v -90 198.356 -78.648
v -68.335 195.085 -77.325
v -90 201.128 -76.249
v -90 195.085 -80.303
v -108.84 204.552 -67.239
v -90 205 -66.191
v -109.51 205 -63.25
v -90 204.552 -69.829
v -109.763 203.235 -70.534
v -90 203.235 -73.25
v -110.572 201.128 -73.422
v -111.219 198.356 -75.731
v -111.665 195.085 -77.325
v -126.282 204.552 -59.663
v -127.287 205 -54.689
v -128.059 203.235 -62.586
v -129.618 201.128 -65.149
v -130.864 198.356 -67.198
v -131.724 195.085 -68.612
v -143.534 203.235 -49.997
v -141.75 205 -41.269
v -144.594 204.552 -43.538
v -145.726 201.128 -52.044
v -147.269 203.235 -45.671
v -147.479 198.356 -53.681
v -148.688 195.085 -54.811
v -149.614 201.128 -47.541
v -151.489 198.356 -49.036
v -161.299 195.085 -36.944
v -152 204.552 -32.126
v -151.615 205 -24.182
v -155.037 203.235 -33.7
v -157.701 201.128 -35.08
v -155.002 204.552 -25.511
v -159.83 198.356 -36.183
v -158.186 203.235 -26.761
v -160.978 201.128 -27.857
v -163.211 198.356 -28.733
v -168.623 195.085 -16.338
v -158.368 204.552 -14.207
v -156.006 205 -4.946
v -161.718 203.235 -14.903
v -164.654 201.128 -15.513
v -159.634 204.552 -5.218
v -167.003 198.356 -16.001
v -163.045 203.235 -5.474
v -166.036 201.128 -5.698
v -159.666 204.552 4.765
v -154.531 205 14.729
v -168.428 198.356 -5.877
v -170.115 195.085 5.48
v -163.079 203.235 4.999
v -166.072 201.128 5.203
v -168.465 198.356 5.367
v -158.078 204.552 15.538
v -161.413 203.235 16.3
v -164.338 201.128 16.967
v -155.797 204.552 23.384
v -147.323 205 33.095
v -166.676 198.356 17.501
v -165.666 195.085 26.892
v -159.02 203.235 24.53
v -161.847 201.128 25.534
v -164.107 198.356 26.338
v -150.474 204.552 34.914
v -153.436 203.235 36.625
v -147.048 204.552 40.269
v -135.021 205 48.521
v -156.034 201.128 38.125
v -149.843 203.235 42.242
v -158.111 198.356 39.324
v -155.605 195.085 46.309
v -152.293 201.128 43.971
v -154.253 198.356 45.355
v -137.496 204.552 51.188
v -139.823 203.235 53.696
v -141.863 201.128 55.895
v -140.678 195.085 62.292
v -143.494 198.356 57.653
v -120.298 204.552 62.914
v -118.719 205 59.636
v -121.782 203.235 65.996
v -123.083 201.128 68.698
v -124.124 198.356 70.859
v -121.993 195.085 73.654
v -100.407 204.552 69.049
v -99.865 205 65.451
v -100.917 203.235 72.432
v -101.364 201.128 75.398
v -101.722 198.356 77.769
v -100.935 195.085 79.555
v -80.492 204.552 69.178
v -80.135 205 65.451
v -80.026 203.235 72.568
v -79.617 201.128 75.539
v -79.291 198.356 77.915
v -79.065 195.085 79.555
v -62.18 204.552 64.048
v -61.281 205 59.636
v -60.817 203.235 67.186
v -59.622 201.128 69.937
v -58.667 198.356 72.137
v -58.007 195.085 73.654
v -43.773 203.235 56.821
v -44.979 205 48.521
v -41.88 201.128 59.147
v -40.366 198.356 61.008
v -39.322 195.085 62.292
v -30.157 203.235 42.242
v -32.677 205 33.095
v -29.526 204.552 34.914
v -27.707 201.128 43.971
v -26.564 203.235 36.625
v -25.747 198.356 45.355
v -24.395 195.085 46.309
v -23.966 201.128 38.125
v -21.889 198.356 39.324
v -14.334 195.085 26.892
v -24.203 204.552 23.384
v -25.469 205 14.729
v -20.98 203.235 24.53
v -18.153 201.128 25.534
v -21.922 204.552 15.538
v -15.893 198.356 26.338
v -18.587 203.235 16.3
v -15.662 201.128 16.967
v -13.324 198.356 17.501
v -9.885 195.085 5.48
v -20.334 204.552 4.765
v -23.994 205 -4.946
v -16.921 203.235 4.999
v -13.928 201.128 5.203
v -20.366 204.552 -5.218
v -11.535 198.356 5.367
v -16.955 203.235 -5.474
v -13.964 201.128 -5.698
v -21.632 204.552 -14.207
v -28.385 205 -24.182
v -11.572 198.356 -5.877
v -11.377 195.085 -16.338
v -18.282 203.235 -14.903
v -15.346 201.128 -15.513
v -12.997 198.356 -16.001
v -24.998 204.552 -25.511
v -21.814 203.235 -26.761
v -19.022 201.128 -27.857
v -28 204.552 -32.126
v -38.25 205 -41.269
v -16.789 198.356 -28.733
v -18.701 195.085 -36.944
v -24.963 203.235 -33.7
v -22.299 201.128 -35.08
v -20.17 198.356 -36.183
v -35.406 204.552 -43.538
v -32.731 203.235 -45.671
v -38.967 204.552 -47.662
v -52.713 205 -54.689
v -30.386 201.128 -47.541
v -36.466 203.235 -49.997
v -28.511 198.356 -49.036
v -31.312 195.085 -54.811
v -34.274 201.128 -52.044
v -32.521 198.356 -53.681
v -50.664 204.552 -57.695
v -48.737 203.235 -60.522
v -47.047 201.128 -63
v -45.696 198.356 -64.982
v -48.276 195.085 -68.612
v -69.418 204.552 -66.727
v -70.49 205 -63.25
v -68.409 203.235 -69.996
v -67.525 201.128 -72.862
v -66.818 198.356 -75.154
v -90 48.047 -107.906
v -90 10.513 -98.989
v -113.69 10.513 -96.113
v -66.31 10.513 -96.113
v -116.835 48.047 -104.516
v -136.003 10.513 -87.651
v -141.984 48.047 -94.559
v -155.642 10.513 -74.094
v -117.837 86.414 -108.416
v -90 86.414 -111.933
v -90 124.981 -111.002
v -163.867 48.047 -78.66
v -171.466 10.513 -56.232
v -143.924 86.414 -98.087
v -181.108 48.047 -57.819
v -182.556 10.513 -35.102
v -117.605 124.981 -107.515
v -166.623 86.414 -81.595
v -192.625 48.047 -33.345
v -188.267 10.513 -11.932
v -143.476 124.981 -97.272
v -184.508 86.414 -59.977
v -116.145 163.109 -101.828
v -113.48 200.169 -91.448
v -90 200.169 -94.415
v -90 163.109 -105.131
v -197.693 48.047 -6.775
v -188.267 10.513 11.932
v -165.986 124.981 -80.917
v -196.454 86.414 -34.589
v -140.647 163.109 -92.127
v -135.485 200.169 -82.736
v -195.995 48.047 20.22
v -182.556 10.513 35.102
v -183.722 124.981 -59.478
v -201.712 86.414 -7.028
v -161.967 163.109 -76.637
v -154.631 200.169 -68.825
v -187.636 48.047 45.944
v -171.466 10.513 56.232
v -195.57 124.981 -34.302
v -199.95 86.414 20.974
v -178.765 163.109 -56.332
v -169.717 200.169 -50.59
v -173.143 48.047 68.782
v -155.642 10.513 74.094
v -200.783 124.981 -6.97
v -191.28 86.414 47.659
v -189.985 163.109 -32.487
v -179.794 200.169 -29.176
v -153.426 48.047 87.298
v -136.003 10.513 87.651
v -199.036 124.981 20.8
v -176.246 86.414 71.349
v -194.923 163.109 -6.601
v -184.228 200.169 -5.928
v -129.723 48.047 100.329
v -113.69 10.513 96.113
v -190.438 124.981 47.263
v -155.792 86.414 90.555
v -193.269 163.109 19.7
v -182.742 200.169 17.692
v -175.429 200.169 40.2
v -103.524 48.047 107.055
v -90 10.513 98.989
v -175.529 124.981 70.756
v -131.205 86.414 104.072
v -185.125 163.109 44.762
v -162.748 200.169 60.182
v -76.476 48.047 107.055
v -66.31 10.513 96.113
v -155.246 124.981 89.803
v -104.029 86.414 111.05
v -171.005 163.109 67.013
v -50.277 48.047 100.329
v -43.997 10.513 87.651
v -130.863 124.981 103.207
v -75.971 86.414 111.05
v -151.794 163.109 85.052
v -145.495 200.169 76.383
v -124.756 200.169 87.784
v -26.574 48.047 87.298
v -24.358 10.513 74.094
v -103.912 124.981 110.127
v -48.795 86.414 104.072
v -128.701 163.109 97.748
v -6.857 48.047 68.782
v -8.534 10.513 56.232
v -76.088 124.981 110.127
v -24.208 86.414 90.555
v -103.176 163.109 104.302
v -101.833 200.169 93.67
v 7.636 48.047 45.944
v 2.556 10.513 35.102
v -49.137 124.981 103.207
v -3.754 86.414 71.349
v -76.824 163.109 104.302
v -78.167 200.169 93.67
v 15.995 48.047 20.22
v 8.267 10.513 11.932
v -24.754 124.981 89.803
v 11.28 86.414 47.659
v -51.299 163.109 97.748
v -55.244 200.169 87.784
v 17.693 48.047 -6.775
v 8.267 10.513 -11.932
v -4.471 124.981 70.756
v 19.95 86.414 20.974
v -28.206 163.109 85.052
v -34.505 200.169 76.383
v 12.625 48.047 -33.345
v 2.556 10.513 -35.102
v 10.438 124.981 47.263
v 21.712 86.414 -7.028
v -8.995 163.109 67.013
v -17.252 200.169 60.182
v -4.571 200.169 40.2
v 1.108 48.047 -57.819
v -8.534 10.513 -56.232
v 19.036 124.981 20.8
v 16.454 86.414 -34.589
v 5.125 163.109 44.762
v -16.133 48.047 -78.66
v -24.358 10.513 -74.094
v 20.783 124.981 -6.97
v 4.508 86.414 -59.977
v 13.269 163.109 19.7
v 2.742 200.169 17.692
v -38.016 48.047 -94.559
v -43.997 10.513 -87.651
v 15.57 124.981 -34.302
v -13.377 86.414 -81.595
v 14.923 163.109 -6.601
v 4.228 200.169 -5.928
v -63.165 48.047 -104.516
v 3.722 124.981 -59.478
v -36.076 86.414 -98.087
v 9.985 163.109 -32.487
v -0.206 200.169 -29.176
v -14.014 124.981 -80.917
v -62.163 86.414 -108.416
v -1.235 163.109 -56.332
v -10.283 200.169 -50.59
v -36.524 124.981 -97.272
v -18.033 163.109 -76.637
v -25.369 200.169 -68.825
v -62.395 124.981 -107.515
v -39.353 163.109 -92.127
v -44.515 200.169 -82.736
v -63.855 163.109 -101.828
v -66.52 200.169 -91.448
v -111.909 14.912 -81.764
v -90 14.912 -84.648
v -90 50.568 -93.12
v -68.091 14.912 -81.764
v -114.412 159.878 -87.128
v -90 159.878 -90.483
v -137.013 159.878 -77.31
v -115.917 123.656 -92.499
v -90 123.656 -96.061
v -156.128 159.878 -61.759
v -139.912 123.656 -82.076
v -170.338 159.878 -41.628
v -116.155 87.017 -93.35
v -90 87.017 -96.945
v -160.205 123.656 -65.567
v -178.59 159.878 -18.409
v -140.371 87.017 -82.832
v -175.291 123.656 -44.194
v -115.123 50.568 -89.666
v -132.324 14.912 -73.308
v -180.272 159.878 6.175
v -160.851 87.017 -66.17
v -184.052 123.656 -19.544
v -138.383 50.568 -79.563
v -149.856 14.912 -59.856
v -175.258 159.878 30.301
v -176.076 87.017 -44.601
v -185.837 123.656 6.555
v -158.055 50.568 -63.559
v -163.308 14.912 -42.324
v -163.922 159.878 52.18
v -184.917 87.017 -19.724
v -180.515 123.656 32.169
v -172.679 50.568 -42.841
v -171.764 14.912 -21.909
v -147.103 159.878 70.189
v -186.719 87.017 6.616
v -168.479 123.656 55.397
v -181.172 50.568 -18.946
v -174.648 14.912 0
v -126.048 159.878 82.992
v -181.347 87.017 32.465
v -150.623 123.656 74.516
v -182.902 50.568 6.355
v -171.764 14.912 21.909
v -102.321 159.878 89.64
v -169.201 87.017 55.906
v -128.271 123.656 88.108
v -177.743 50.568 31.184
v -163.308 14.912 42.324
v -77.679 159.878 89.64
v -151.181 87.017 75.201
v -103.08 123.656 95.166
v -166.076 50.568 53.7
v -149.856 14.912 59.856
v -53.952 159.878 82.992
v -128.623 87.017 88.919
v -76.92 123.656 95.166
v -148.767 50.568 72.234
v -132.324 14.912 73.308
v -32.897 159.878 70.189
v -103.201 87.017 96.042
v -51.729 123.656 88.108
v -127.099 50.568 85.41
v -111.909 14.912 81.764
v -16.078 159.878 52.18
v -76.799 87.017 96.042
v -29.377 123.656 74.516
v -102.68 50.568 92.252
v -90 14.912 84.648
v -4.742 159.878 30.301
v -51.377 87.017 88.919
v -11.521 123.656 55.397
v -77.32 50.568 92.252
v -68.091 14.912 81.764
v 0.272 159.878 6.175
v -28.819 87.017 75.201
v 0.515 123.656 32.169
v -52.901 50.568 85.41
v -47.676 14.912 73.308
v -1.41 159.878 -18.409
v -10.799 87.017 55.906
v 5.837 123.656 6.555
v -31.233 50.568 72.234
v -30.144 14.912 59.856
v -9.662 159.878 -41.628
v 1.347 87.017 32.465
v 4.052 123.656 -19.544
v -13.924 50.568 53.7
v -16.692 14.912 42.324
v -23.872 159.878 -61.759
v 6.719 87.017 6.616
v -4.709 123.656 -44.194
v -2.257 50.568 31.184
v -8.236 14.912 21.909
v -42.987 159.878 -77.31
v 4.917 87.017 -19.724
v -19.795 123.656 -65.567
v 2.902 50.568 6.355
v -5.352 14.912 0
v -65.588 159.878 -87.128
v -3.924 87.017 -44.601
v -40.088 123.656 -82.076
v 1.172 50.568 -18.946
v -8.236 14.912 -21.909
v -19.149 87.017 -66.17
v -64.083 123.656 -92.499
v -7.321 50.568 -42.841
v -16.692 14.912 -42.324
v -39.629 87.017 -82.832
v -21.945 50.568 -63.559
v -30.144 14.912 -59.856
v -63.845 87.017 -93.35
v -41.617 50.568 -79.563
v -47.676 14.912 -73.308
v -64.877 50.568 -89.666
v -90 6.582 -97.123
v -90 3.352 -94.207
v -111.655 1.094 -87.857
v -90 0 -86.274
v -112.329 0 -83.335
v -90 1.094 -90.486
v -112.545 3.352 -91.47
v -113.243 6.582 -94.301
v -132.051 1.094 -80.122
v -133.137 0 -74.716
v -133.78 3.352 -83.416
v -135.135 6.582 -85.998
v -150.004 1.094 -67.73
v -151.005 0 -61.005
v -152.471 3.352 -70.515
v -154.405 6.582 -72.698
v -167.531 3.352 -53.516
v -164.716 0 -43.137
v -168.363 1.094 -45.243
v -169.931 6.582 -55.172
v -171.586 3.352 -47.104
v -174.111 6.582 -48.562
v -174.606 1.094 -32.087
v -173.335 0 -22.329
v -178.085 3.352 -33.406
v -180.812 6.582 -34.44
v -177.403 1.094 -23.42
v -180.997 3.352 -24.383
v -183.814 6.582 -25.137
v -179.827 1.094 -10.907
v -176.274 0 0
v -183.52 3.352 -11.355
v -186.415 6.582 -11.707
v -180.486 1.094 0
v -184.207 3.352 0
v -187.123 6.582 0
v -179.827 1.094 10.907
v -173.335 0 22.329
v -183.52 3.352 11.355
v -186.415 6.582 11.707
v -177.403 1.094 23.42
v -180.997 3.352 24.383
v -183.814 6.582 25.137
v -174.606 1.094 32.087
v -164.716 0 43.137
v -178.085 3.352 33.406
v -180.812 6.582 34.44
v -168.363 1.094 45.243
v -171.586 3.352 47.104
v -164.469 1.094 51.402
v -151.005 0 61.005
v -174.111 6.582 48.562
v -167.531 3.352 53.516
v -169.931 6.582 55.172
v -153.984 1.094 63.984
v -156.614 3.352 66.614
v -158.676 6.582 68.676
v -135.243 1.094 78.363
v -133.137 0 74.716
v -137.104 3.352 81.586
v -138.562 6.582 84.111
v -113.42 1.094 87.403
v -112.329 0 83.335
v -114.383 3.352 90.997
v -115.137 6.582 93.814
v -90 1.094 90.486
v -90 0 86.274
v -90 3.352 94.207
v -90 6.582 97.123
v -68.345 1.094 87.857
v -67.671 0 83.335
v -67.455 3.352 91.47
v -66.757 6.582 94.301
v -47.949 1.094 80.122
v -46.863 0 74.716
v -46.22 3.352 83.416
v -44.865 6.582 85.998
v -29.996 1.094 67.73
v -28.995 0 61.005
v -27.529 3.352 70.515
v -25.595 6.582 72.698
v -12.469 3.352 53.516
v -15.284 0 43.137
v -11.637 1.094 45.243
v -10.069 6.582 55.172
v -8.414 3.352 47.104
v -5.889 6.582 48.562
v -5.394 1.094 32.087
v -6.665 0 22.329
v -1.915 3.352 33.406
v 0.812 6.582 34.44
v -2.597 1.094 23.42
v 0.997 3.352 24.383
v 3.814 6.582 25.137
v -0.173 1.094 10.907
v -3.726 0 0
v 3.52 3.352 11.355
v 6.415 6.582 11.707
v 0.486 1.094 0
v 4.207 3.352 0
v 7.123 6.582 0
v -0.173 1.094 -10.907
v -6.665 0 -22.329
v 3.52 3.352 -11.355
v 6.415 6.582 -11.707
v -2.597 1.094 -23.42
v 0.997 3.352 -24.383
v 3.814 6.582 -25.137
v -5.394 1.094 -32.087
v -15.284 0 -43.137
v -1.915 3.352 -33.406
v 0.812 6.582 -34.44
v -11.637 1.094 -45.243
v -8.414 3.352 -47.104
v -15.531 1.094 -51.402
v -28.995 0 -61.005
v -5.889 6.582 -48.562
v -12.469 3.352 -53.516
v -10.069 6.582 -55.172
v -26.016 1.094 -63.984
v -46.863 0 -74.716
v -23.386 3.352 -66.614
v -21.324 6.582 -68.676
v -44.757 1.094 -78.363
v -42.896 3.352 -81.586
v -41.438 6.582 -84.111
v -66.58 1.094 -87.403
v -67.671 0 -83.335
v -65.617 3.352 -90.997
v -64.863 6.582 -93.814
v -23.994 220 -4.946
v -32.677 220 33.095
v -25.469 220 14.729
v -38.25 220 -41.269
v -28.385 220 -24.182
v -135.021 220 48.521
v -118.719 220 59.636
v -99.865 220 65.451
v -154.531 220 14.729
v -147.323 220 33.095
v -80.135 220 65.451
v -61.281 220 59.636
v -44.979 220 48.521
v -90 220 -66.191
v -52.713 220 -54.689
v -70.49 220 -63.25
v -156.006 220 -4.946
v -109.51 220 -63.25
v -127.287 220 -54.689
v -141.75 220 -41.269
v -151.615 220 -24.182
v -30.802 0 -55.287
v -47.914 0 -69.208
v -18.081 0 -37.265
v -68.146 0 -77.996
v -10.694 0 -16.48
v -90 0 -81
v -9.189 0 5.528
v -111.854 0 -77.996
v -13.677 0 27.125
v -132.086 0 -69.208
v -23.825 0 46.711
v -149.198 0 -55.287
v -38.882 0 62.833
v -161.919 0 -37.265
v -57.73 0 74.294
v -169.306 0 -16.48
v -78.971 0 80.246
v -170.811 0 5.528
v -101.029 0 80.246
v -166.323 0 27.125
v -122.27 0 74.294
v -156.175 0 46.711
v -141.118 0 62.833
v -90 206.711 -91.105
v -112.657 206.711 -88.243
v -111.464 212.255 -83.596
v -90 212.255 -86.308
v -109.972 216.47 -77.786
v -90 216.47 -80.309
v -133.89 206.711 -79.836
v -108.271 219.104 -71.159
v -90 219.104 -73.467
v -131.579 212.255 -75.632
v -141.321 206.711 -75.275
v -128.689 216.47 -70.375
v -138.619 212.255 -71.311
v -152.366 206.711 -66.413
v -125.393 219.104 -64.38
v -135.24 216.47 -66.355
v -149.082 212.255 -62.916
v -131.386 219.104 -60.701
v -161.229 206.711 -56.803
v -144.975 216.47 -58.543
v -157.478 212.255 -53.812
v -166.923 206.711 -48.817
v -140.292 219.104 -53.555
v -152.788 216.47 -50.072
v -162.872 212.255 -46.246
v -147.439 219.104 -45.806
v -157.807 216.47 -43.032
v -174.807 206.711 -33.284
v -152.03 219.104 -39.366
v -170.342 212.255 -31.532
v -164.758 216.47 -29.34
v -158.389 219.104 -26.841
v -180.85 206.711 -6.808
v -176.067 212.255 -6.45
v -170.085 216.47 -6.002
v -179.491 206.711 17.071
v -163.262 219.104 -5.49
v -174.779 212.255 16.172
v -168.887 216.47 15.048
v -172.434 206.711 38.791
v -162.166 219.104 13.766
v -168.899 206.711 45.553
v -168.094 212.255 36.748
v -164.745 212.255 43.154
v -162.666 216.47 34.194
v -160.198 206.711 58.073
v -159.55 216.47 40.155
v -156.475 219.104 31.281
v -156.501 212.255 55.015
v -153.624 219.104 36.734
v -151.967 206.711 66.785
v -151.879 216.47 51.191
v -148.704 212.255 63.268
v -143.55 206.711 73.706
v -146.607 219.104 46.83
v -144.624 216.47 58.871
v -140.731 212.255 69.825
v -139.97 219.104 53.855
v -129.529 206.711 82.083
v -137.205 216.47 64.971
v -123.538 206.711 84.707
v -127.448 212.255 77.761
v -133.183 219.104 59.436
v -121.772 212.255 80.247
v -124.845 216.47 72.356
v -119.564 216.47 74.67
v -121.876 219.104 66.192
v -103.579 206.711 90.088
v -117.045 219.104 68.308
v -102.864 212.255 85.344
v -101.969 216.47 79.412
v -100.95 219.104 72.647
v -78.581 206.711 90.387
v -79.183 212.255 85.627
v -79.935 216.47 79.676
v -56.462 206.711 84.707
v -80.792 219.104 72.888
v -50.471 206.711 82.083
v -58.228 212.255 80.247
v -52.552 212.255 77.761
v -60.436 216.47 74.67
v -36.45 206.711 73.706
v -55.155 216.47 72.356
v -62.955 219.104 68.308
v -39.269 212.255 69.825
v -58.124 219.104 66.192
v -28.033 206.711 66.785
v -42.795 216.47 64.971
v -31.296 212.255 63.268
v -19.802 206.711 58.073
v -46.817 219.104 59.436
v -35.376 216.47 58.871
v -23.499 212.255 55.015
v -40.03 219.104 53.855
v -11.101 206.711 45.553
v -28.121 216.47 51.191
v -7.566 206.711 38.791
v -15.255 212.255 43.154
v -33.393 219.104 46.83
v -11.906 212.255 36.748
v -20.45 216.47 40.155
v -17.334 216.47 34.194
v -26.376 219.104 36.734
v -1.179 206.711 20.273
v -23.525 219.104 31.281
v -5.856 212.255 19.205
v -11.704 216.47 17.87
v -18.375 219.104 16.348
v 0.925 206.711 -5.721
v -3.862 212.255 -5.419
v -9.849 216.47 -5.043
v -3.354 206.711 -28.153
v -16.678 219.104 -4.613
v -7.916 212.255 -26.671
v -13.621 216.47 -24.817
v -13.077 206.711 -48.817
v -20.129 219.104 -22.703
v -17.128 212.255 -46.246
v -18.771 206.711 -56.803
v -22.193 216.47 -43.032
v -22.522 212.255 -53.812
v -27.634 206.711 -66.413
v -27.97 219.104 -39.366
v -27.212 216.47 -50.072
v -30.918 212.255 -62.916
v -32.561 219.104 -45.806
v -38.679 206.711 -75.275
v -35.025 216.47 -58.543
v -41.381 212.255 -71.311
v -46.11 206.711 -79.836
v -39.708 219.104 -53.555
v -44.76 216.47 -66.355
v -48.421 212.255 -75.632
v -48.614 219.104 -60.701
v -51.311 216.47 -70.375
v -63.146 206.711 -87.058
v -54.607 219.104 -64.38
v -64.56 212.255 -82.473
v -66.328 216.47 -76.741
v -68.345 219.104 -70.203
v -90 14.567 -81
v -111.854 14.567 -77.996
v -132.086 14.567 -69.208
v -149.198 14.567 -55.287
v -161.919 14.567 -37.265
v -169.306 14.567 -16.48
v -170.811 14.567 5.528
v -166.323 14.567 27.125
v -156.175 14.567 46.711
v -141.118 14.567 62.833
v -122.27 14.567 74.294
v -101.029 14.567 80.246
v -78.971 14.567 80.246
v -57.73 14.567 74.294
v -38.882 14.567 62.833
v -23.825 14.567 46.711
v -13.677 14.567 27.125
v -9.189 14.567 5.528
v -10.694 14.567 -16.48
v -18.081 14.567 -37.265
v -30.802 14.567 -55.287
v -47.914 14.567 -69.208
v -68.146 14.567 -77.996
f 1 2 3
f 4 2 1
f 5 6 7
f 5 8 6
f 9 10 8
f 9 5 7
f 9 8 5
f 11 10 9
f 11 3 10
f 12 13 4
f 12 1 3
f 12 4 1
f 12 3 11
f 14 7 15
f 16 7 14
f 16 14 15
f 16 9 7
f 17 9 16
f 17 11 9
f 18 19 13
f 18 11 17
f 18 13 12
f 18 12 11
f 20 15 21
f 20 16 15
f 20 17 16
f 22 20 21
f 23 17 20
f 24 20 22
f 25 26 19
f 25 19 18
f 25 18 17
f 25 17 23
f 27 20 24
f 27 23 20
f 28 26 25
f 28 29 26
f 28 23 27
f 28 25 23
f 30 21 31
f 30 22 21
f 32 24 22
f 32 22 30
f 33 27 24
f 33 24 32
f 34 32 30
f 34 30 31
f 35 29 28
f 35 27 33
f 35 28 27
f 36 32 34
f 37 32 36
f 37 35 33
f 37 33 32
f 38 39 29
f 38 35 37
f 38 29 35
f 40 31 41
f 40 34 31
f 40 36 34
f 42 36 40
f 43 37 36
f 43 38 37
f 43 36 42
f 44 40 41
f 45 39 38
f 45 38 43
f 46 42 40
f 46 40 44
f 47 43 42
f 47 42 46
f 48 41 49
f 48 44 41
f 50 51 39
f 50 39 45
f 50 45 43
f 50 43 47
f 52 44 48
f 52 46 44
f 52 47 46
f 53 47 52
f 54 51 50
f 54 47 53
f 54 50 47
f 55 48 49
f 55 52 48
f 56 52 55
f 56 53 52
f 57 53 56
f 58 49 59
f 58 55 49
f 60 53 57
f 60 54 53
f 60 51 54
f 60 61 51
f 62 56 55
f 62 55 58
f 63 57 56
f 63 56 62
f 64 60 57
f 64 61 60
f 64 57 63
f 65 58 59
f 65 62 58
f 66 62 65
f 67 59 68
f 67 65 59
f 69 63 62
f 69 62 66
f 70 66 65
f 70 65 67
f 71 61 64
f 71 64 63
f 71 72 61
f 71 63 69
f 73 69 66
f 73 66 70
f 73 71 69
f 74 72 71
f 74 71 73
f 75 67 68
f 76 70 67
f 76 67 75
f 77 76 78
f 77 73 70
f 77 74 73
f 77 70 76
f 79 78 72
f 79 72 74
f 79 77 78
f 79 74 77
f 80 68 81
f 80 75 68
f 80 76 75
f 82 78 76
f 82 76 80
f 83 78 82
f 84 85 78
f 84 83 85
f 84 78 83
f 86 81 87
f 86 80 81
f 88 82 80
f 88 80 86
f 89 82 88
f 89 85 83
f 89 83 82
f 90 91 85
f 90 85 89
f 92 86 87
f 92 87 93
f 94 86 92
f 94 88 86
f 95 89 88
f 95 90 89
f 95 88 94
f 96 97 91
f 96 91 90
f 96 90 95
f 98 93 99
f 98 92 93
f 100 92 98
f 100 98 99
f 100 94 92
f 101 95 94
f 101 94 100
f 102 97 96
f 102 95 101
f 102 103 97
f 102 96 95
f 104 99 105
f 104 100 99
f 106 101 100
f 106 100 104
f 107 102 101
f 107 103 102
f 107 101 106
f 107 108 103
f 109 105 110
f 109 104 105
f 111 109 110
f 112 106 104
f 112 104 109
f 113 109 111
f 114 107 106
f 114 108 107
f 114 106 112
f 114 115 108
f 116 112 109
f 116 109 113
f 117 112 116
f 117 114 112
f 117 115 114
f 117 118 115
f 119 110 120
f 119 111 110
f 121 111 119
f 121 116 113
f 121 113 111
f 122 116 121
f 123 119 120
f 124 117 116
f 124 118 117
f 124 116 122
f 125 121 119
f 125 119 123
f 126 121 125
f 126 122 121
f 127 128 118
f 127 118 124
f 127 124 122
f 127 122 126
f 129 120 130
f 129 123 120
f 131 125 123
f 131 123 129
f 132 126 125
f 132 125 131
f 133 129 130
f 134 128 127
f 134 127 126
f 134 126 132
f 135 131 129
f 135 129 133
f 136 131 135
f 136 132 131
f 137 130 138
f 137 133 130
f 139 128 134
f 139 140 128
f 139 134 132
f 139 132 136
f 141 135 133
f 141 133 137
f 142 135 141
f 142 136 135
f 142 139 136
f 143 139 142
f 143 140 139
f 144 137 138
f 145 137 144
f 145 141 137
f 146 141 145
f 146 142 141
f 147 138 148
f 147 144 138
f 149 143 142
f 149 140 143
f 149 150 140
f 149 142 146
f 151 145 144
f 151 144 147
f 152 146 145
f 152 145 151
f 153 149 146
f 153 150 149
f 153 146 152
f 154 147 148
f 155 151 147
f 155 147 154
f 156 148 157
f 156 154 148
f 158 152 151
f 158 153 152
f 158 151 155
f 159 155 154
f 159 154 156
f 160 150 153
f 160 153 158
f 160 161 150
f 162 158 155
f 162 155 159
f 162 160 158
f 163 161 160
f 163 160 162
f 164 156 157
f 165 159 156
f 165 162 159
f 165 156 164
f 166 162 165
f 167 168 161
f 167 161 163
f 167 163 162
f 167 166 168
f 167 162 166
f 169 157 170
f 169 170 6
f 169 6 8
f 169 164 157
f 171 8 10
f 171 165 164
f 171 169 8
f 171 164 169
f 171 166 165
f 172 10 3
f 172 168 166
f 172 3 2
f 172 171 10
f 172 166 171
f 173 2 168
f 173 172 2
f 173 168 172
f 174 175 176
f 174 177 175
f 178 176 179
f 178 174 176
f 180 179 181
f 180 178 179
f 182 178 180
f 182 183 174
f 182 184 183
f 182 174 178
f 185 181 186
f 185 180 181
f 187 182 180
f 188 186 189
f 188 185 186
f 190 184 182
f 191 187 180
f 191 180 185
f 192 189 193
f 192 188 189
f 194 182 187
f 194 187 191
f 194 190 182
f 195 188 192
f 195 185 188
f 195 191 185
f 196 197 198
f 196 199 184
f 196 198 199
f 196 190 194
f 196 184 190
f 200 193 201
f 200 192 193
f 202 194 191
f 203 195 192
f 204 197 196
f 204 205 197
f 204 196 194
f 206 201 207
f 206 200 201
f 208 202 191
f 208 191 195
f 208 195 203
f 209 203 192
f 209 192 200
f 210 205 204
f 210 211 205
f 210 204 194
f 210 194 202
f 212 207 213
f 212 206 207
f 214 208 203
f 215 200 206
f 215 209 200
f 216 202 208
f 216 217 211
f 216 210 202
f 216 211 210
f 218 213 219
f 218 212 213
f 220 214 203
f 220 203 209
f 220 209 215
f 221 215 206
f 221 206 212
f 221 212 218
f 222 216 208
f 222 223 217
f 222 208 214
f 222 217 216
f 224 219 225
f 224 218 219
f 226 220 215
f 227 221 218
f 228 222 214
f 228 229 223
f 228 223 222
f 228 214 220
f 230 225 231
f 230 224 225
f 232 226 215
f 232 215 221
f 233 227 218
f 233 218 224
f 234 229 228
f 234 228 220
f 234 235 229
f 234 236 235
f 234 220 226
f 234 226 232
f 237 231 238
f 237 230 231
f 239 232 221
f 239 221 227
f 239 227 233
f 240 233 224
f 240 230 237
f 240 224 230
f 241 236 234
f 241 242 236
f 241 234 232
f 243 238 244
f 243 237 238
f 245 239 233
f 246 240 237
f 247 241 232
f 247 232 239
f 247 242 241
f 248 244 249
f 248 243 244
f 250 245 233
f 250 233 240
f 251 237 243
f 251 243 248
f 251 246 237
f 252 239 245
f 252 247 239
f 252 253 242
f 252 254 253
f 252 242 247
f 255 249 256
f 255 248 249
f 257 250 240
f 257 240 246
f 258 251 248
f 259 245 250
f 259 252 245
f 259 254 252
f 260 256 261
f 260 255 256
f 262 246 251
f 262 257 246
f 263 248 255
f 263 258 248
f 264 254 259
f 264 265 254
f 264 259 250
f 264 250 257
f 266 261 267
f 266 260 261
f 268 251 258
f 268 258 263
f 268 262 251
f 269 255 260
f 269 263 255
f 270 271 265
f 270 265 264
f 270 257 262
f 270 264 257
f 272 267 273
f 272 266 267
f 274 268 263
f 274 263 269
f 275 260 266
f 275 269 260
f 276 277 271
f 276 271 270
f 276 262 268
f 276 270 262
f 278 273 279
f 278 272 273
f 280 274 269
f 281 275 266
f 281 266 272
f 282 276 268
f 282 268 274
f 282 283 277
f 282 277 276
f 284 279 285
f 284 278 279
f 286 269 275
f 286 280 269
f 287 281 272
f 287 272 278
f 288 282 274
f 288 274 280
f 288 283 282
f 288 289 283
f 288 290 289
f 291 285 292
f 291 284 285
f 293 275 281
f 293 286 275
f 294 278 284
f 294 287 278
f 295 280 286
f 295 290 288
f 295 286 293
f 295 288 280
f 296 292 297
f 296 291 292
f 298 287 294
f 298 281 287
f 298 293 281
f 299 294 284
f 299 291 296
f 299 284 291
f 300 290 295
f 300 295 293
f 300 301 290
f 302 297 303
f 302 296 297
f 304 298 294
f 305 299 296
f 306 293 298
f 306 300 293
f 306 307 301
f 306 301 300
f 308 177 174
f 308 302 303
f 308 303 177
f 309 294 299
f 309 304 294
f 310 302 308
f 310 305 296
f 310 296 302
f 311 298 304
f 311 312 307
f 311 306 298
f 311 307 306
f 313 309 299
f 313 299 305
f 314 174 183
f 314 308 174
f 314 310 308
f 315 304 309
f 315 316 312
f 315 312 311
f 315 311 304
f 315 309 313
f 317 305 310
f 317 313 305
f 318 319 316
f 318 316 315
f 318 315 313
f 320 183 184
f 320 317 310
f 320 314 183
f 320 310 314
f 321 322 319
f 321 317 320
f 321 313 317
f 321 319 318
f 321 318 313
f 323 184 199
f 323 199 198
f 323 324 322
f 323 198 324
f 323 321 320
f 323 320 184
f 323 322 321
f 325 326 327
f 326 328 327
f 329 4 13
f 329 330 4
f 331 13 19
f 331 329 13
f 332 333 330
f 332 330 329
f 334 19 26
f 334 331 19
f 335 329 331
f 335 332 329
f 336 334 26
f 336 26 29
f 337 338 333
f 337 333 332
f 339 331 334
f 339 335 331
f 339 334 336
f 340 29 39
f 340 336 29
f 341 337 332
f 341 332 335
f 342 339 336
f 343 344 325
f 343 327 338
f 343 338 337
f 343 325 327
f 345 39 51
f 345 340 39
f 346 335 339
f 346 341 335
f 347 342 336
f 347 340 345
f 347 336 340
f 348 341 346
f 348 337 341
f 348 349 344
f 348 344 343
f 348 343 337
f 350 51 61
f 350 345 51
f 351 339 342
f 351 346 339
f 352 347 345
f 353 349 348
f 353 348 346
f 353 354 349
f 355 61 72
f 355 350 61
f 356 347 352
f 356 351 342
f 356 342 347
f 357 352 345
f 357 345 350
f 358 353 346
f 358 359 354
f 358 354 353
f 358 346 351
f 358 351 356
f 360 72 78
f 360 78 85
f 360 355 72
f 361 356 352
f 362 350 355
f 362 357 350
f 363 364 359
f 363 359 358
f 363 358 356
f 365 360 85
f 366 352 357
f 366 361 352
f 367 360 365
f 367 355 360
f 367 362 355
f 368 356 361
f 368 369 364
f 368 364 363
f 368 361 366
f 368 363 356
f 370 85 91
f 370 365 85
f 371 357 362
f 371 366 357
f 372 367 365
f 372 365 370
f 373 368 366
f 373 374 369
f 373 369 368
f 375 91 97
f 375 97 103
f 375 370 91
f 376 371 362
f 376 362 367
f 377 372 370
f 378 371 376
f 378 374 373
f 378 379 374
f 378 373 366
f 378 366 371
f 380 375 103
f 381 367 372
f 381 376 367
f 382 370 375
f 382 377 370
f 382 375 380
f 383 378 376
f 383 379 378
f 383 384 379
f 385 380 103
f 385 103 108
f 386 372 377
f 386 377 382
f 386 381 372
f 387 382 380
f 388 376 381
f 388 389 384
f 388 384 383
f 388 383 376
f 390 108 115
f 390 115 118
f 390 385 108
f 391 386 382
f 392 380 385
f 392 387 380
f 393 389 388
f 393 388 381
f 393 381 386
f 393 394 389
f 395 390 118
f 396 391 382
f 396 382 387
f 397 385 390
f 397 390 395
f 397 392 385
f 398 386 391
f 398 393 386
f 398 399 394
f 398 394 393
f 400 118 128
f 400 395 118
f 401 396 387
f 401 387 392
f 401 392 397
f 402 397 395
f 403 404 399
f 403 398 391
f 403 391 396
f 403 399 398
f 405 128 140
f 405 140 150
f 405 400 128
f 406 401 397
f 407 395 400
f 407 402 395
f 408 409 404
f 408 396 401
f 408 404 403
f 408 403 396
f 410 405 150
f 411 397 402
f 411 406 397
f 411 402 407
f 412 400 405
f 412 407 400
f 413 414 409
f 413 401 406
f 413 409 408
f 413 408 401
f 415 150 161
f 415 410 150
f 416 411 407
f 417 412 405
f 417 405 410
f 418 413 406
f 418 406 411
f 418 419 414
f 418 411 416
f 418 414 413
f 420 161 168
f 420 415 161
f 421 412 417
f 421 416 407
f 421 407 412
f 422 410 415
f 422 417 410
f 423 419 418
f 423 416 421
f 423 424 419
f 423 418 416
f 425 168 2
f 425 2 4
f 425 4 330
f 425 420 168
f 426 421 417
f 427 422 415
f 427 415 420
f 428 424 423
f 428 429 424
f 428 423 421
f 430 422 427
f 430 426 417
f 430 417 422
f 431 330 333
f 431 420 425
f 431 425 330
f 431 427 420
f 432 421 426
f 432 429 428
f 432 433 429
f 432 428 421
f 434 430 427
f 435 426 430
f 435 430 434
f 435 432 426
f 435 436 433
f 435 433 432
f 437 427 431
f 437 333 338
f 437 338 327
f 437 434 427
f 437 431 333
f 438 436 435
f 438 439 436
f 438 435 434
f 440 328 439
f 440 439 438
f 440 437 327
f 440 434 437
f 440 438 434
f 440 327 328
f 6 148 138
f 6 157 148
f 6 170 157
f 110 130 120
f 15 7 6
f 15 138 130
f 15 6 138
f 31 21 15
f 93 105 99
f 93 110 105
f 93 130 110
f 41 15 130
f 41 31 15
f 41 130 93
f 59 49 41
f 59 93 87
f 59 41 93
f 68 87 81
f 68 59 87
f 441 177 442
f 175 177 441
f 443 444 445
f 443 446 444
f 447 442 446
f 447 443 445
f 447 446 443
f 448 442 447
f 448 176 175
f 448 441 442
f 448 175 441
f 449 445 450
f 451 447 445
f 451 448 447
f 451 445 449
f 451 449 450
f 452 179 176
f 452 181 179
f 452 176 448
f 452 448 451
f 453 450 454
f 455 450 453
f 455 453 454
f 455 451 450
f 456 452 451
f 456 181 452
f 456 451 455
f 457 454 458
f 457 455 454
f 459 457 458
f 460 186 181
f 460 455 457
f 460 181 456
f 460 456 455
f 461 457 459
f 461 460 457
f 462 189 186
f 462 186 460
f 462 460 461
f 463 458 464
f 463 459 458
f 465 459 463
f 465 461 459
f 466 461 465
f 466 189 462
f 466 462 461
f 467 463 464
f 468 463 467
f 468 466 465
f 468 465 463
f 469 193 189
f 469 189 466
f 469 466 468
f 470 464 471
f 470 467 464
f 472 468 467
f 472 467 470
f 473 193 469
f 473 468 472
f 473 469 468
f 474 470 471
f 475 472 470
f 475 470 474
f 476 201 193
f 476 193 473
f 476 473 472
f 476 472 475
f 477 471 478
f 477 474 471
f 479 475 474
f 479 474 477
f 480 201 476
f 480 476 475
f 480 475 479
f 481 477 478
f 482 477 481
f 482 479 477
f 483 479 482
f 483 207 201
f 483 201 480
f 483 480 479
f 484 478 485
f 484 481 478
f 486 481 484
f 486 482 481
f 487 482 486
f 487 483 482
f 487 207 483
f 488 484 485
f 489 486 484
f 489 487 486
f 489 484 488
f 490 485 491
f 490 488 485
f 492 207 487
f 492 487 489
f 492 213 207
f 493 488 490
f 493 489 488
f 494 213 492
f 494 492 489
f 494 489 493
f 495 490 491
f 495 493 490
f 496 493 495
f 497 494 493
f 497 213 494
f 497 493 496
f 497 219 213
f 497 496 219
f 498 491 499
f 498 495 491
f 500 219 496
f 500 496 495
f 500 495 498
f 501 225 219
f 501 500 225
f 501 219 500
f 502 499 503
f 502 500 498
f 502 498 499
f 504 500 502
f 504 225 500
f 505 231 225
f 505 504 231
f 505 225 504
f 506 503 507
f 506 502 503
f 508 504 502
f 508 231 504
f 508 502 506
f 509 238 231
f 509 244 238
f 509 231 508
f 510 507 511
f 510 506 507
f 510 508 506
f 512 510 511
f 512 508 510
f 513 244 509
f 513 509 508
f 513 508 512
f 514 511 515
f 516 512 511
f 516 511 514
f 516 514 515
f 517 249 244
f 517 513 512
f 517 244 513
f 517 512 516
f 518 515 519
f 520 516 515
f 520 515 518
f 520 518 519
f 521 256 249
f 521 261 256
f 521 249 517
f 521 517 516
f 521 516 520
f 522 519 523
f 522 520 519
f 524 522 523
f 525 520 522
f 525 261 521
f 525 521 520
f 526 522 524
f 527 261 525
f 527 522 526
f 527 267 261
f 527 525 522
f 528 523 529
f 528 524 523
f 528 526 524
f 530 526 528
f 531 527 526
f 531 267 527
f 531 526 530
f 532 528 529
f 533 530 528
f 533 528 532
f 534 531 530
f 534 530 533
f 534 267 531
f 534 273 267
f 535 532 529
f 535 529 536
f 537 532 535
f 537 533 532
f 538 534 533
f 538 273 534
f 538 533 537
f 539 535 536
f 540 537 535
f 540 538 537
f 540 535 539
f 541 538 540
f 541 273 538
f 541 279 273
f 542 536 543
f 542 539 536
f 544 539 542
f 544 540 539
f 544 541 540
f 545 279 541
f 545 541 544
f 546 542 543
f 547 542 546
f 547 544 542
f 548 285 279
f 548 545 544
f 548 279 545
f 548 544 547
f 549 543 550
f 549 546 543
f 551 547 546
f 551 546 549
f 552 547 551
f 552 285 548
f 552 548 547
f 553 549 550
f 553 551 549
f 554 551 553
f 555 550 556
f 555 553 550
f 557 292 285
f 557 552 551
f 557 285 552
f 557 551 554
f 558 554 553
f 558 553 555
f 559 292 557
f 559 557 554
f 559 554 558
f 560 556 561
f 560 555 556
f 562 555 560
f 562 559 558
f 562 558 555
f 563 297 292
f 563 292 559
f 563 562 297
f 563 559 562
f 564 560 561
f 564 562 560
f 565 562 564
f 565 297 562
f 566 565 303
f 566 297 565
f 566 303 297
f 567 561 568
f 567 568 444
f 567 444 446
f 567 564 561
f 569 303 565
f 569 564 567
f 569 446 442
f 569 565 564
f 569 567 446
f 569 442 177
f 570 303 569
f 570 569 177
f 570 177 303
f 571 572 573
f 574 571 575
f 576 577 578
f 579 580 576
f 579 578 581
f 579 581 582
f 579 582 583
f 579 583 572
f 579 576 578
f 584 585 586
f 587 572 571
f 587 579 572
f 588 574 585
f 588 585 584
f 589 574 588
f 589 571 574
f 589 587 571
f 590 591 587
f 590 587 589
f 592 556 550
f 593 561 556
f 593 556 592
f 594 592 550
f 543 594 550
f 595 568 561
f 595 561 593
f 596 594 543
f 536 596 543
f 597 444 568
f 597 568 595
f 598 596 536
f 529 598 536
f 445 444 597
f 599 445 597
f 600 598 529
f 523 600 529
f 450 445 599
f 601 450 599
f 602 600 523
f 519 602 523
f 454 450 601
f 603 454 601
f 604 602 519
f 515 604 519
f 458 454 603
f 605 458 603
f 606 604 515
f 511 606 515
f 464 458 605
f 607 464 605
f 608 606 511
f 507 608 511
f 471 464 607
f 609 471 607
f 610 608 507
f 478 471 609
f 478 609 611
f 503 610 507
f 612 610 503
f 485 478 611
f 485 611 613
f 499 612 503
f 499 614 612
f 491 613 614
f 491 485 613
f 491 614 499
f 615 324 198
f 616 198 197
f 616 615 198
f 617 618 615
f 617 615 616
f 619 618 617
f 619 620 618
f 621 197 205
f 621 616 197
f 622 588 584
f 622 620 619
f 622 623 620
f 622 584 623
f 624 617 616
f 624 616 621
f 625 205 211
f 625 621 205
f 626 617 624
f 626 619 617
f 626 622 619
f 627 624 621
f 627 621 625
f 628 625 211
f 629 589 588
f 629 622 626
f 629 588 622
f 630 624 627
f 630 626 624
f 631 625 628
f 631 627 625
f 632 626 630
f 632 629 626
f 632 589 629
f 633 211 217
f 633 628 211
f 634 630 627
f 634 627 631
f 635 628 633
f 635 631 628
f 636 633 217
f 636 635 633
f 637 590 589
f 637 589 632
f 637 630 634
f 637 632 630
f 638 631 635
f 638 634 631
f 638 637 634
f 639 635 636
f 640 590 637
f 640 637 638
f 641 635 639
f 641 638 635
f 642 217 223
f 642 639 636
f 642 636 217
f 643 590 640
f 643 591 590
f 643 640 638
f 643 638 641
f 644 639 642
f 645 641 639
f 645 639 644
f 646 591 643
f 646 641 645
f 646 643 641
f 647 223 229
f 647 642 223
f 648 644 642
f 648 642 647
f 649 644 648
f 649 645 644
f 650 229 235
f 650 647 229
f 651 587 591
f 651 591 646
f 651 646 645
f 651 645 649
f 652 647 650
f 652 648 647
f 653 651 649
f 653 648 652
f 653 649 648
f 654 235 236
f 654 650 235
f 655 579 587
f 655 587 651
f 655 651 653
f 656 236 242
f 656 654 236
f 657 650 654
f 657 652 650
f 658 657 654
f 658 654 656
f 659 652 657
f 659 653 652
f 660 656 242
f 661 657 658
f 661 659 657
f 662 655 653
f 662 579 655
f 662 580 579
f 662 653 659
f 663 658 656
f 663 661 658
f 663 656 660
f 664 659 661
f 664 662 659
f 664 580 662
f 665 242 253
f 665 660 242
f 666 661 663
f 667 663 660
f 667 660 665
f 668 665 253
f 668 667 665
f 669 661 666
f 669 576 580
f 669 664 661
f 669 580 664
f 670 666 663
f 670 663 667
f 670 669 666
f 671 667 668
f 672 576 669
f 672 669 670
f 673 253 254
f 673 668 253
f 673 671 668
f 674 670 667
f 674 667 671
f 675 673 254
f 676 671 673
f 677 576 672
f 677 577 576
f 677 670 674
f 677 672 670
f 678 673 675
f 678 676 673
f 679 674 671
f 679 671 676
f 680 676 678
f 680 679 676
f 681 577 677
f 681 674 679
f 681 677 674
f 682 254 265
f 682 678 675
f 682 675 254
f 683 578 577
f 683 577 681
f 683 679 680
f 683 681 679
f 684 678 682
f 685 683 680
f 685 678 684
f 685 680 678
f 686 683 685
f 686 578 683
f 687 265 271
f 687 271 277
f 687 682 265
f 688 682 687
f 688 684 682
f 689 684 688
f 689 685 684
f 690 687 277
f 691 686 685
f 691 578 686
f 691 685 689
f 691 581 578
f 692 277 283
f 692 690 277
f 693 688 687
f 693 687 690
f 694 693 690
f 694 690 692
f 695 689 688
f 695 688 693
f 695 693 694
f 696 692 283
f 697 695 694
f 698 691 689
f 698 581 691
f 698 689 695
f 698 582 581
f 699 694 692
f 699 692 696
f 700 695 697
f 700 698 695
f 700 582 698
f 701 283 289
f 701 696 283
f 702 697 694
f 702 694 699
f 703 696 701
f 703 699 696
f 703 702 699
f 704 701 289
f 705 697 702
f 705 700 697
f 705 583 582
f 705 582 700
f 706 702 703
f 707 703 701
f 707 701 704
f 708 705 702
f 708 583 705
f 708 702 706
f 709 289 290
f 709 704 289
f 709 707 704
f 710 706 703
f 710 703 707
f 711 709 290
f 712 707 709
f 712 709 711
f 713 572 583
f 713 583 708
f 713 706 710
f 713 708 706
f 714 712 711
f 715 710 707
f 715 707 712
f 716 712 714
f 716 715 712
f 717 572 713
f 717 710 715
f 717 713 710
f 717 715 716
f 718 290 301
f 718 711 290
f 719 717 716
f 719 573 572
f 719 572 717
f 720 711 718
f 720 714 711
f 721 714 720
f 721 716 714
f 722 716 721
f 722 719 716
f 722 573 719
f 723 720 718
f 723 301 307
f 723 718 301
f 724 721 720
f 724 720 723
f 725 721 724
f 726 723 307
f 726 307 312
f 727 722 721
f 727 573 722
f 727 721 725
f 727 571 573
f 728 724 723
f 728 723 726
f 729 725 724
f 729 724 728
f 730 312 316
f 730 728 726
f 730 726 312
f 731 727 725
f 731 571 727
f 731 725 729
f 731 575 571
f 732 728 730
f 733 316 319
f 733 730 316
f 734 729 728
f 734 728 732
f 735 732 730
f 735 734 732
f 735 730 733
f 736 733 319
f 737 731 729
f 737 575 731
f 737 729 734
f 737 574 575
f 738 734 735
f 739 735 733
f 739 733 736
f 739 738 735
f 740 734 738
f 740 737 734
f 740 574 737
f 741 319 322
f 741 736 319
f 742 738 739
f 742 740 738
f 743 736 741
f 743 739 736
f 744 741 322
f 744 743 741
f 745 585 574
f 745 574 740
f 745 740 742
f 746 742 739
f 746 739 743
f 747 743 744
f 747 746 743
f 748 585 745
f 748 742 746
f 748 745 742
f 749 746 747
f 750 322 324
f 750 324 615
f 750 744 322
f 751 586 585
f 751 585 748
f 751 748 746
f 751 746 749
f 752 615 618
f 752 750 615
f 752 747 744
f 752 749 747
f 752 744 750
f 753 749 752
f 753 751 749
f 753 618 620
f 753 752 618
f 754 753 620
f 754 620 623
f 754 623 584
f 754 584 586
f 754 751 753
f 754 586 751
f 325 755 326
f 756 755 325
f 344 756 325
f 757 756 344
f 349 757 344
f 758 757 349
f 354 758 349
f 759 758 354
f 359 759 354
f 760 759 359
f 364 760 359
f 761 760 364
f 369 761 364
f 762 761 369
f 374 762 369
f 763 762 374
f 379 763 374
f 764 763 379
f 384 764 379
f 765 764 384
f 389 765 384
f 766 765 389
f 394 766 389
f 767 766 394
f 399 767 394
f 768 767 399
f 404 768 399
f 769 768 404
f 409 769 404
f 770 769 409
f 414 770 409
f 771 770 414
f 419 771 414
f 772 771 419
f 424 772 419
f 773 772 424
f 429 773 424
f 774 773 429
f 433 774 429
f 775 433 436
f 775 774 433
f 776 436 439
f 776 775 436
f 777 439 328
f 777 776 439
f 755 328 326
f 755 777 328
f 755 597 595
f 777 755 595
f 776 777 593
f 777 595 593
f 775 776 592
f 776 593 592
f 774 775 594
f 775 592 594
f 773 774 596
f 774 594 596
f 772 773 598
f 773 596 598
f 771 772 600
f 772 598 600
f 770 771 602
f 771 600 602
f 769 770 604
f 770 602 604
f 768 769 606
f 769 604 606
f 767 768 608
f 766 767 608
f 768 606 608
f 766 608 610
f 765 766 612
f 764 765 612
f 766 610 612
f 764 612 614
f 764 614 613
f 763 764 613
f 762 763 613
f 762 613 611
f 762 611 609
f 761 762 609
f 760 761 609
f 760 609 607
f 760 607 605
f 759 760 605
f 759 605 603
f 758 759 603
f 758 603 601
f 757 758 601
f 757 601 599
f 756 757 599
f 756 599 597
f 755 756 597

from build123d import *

# Parameters (mm, degrees)
SKETCH3_R          = 81
SKETCH3_R_2        = 77.501248024
CUT_EXTRUDE1_DEPTH = 20


with BuildPart() as part:
    # Sketch2 → Revolve1 (revolve)
    with BuildSketch(Plane.XY, mode=Mode.PRIVATE) as revolve1_sk:
        with BuildLine():
            ThreePointArc((4.414536229, 200.169084884), (-6.562247931, 214.546614293), (-23.8093847, 220))
            Line((-23.8093847, 220), (-90, 220))
            Line((-90, 220), (-90, 205))
            Line((-90, 205), (-23.8093847, 205))
            ThreePointArc((-23.8093847, 205), (-15.185816315, 202.273307147), (-9.697424235, 195.084542442))
            ThreePointArc((-9.697424235, 195.084542442), (7.092454929, 105.350657564), (-5.351514207, 14.911629651))
            Line((-5.351514207, 14.911629651), (-12.498751976, 14.23707021))
            Line((-12.498751976, 14.23707021), (-12.498751976, 0))
            Line((-12.498751976, 0), (-3.725690982, 0))
            ThreePointArc((-3.725690982, 0), (4.207002118, 3.351579232), (8.989178365, 10.513387209))
            ThreePointArc((8.989178365, 10.513387209), (22.088093244, 105.71236396), (4.414536229, 200.169084884))
        make_face()
    revolve(revolve1_sk.sketch.rotate(Axis((-90, -83.445440151, 0), (0, 1, 0)), 90), axis=Axis((-90, -83.445440151, 0), (0, 1, 0)))

    # Sketch3 → Cut-Extrude1 (cut)
    with BuildSketch(Plane.XZ):
        with Locations(Location((-90, 0, 0), (0, 0, 270))):
            Circle(SKETCH3_R)
        with Locations((-90, 0)):
            Circle(SKETCH3_R_2, mode=Mode.SUBTRACT)
    extrude(amount=-CUT_EXTRUDE1_DEPTH, mode=Mode.SUBTRACT)


solid = part.part
